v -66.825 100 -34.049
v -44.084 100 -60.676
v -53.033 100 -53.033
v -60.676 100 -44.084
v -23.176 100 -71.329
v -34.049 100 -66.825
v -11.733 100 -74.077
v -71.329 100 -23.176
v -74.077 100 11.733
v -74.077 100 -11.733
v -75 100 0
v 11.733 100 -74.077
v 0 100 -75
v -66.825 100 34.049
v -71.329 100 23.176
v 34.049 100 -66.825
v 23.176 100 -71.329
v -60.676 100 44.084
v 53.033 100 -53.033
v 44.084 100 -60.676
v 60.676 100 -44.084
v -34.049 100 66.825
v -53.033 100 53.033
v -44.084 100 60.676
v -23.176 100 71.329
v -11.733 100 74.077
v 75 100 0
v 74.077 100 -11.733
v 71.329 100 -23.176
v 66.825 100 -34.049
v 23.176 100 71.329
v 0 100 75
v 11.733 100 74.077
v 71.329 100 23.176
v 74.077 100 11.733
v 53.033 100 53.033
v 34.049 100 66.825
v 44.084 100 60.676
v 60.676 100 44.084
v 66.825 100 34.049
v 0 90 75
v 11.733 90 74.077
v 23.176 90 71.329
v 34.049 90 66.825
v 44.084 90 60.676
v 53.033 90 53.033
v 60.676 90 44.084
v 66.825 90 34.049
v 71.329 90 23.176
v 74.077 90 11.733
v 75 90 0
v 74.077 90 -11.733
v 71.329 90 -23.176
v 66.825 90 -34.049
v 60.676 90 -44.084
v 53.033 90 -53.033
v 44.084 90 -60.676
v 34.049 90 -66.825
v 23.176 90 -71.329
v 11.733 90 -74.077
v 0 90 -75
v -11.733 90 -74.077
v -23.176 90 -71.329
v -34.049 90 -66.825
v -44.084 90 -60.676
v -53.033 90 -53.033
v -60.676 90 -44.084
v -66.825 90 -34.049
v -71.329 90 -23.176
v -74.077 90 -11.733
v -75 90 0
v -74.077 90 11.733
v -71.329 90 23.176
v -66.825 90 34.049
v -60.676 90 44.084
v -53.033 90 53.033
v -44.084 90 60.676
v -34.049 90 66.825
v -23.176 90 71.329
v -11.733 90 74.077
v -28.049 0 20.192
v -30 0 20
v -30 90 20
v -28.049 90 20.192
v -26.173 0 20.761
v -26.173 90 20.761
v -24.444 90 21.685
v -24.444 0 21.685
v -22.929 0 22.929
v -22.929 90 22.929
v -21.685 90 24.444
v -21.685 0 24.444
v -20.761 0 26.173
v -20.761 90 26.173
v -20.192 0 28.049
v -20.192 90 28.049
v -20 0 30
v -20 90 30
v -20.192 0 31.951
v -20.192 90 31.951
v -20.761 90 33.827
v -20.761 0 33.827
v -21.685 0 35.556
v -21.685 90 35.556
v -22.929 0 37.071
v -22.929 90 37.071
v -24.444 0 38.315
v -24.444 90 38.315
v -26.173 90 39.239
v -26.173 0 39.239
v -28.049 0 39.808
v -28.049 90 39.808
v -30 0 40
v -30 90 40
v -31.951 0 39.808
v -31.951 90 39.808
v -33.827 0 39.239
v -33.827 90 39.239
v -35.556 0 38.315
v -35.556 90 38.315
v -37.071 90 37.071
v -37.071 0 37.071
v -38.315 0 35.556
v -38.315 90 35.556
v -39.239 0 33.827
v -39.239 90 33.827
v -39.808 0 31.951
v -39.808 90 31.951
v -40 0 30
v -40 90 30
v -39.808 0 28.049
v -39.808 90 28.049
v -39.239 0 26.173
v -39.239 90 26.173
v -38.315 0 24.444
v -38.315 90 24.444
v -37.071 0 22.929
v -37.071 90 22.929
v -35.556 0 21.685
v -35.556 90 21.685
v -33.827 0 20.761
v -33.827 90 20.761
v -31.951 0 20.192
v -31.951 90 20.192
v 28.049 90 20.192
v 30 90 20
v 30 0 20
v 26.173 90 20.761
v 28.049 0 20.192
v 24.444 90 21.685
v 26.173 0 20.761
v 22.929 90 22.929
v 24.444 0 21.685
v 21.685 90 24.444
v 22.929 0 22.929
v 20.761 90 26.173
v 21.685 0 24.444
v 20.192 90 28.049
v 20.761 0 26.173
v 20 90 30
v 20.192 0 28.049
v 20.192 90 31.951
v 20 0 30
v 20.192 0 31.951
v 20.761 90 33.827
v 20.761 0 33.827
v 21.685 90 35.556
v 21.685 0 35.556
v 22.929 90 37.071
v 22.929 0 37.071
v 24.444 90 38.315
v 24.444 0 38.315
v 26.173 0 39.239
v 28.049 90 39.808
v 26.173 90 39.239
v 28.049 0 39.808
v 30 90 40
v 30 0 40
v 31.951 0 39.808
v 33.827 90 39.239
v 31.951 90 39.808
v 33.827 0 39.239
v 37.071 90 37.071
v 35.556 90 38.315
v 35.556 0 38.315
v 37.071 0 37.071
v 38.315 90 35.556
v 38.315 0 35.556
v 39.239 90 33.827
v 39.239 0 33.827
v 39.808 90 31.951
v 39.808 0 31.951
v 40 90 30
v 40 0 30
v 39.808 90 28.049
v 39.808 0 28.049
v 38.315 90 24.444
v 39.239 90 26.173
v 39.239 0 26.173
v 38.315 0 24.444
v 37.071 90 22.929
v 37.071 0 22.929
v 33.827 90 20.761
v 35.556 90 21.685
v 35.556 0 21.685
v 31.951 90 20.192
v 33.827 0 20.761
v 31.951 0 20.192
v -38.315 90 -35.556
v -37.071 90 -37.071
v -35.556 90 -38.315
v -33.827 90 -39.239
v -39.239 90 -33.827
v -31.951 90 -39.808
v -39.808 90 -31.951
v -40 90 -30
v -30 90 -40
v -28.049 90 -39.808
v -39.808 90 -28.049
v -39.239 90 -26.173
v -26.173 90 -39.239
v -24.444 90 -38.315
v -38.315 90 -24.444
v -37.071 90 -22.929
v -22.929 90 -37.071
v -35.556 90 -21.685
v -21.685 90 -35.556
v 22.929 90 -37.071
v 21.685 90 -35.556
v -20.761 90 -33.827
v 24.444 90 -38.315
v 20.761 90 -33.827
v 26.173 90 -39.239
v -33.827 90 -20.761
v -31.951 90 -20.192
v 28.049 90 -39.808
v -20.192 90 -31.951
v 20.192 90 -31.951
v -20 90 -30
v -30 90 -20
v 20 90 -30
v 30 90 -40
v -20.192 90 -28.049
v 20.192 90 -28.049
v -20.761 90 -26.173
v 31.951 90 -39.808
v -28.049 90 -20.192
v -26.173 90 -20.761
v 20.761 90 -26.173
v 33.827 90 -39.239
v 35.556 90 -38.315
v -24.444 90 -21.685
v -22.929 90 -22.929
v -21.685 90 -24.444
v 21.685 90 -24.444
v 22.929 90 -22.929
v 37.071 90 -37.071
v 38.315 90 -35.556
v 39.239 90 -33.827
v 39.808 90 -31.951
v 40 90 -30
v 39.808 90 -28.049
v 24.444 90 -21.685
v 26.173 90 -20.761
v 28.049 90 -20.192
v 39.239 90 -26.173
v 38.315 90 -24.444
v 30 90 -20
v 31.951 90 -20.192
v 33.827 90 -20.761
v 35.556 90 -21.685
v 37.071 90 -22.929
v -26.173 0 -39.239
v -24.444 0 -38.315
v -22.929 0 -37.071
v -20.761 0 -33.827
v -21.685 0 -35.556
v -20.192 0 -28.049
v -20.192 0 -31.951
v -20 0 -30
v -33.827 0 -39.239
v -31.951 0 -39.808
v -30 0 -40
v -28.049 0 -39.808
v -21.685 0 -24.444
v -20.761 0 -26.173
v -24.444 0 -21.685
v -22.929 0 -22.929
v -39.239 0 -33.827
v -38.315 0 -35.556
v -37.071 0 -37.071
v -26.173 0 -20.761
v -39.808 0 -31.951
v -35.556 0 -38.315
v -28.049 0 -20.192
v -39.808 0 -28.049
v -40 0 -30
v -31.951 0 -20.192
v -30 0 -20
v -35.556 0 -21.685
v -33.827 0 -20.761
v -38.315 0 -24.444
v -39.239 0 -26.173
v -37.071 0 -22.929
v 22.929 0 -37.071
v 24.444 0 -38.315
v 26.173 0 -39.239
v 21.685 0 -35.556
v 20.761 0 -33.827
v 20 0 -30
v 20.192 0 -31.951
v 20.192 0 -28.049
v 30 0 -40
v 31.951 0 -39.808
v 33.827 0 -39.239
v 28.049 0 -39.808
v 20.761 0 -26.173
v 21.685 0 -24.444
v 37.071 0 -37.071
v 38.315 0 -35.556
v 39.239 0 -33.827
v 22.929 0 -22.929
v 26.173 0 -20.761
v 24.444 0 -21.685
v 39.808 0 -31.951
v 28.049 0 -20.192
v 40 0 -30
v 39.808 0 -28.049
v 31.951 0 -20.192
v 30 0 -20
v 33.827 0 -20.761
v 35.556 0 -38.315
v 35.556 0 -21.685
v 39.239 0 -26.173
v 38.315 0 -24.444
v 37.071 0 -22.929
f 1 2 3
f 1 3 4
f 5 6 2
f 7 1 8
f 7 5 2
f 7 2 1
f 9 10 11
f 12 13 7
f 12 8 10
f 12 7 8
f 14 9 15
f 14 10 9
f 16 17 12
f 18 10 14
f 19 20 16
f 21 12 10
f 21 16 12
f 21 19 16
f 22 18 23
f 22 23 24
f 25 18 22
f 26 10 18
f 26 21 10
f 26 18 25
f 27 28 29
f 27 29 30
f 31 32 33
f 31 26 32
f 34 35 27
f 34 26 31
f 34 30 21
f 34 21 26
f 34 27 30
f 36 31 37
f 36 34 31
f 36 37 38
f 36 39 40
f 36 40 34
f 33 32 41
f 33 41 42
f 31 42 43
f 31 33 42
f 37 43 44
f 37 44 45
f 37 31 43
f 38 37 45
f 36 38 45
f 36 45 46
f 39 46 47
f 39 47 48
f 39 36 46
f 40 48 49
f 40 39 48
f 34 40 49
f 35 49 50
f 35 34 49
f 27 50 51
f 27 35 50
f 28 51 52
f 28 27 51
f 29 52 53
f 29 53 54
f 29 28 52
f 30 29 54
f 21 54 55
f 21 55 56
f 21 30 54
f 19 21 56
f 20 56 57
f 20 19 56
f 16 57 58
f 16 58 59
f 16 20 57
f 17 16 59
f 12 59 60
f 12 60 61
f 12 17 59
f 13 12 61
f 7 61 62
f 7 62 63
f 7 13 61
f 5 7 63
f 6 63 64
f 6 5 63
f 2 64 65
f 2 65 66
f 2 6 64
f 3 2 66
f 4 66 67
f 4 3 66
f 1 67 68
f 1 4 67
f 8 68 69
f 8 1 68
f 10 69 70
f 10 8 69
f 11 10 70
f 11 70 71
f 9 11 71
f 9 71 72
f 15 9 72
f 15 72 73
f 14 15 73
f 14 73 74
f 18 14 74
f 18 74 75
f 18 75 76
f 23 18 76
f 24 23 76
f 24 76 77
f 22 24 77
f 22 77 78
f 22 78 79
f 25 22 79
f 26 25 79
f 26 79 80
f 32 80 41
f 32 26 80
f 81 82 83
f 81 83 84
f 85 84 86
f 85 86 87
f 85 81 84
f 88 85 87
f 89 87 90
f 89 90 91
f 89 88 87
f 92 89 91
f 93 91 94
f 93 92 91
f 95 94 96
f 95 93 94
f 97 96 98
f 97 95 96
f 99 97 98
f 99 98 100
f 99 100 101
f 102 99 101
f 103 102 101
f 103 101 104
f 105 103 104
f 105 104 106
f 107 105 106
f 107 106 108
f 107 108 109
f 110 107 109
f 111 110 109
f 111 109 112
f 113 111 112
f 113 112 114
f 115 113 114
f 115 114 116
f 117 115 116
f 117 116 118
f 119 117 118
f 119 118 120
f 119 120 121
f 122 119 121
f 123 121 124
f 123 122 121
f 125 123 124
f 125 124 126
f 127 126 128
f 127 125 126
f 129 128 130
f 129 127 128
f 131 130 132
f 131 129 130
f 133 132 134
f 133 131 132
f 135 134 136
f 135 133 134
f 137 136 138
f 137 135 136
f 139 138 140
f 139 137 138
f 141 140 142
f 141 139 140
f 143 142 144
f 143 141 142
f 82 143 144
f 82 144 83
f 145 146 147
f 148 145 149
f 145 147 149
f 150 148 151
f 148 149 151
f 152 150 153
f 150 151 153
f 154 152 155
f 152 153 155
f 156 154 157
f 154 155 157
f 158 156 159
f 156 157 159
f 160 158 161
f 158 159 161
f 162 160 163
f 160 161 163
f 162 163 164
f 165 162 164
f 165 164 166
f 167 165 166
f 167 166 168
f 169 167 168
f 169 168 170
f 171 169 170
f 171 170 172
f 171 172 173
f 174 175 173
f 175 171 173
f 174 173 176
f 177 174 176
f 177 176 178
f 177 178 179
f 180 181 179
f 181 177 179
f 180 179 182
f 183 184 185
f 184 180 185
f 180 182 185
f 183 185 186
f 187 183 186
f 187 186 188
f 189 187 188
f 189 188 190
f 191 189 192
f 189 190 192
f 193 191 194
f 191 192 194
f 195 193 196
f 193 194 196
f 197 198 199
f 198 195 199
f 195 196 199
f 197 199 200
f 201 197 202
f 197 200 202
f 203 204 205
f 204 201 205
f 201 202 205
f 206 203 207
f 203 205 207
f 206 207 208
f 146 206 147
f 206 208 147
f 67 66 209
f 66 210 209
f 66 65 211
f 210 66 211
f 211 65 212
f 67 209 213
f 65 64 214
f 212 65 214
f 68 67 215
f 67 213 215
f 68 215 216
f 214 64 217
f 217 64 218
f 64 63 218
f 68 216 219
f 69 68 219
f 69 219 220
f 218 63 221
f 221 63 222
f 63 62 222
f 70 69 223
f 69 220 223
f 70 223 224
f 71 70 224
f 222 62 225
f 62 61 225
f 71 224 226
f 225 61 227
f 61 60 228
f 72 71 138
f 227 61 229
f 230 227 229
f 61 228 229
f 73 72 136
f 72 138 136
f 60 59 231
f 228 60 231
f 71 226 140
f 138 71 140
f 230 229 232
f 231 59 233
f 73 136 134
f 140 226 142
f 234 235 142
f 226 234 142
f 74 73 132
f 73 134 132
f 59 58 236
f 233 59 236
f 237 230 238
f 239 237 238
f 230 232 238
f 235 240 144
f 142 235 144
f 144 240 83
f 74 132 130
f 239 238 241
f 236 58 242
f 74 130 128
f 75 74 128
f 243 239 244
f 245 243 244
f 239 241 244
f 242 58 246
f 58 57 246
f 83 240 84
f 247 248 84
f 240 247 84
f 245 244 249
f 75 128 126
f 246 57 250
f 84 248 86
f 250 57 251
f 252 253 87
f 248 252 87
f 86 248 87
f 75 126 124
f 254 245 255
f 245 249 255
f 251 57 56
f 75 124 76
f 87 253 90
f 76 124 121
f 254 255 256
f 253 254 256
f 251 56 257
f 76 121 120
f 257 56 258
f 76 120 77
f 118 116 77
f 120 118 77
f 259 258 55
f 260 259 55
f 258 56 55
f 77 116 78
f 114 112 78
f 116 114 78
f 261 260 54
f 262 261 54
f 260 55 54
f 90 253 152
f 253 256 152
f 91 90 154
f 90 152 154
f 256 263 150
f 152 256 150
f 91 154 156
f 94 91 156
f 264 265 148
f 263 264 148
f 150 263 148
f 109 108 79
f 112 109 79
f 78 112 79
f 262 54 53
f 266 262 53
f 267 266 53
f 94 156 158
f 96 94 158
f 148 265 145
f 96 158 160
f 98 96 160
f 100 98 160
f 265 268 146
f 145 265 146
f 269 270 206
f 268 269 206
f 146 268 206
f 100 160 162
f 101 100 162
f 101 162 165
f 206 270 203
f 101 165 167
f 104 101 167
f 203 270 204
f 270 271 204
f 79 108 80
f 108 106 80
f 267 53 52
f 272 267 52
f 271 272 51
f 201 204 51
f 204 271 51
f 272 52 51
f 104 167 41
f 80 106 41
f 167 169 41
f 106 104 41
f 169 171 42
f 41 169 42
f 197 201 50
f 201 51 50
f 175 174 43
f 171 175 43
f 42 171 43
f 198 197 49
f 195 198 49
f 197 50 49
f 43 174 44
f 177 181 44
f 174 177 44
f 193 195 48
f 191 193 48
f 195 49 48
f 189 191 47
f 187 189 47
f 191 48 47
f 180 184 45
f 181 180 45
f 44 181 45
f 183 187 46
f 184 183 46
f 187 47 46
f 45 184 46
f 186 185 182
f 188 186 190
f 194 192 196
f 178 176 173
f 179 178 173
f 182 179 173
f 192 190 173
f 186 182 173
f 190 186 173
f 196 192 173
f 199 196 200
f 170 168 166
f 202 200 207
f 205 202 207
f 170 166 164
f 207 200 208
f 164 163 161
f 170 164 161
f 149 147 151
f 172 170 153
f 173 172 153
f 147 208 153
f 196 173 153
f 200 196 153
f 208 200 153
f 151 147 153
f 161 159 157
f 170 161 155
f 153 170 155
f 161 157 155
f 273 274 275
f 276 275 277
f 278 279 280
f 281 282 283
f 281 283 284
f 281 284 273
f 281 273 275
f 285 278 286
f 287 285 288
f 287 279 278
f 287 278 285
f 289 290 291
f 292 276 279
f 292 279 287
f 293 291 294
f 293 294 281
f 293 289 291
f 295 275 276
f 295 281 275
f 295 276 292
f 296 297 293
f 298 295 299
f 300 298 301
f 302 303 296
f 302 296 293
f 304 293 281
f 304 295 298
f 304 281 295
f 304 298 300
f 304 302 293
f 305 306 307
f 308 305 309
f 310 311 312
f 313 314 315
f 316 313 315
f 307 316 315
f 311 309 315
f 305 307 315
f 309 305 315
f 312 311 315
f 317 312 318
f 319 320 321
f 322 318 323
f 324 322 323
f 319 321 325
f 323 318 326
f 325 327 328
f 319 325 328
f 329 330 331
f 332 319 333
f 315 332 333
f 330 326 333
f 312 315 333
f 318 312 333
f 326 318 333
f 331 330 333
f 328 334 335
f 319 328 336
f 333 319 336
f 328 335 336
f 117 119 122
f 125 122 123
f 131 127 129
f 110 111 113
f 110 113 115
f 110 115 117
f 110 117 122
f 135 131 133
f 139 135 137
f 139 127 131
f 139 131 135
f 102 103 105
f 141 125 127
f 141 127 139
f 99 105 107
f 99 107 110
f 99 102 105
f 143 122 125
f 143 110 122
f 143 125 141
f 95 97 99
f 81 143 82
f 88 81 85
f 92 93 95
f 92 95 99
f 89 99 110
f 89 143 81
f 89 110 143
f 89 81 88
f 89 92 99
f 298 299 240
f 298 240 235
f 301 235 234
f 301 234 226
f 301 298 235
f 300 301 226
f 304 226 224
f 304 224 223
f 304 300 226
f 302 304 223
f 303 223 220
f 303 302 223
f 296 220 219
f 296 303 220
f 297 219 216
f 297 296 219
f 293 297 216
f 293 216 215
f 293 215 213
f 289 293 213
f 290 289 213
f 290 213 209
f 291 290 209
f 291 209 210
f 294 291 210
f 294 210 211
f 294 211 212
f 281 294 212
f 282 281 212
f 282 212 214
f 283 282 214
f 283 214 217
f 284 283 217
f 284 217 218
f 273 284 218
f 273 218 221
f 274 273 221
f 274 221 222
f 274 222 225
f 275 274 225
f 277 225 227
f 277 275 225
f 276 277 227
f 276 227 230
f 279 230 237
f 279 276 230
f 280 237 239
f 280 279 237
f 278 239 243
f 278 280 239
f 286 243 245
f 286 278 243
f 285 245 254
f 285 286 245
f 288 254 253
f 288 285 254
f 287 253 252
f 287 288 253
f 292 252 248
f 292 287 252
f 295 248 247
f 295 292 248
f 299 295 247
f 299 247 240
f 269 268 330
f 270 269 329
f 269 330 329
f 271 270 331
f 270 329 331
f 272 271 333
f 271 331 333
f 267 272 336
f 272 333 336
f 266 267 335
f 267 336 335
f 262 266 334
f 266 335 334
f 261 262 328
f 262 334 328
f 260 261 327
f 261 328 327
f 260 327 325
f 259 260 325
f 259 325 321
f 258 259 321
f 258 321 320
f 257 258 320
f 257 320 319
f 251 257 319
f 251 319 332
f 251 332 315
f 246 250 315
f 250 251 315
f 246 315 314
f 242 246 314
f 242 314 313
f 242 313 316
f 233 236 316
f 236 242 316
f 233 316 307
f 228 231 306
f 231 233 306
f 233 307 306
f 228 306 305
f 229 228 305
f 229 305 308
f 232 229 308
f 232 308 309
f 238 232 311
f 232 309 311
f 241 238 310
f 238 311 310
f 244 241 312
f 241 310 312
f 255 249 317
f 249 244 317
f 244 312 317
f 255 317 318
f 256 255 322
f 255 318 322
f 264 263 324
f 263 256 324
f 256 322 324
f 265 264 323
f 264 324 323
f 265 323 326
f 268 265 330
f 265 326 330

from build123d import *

# Parameters (mm, degrees)
SKETCH1_R             = 10
BOSS_EXTRUDE1_DEPTH   = 100
BOSS_EXTRUDE1_2_DEPTH = 100
SKETCH2_R             = 75
BOSS_EXTRUDE2_DEPTH   = 10


with BuildPart() as part:
    # Sketch1 → Boss-Extrude1 (new body)
    with BuildSketch(Plane(origin=(0, 0, 0), x_dir=(1, 0, 0), z_dir=(0, 1, 0))):
        with Locations(Location((30, 30, 0), (0, 0, 270))):
            Circle(SKETCH1_R)
    extrude(amount=BOSS_EXTRUDE1_DEPTH)


with BuildPart() as body_2:
    # Sketch1 → Boss-Extrude1 2 (new body)
    with BuildSketch(Plane(origin=(0, 0, 0), x_dir=(1, 0, 0), z_dir=(0, 1, 0))):
        with Locations(Location((30, -30, 0), (0, 0, 90))):
            Circle(SKETCH1_R)
    extrude(amount=BOSS_EXTRUDE1_2_DEPTH)


with BuildPart() as body_3:
    # Mirror1: mirrored copy
    add(body_2.part.mirror(Plane(origin=(0, 0, 0), x_dir=(0, 0, 1), z_dir=(1, 0, 0))))


with BuildPart() as body_4:
    # Mirror1 2: mirrored copy
    add(part.part.mirror(Plane(origin=(0, 0, 0), x_dir=(0, 0, 1), z_dir=(1, 0, 0))))


with BuildPart() as part_1:
    add(part.part)

    add(body_2.part)  # Boss-Extrude2 merges body 2

    add(body_3.part)  # Boss-Extrude2 merges body 3

    add(body_4.part)  # Boss-Extrude2 merges body 4
    # Sketch2 → Boss-Extrude2 (add)
    with BuildSketch(Plane(origin=(0, 100, 0), x_dir=(1, 0, 0), z_dir=(0, 1, 0))):
        with Locations(Location((0, 0, 0), (0, 0, 270))):
            Circle(SKETCH2_R)
    extrude(amount=-BOSS_EXTRUDE2_DEPTH)


solid = part_1.part
